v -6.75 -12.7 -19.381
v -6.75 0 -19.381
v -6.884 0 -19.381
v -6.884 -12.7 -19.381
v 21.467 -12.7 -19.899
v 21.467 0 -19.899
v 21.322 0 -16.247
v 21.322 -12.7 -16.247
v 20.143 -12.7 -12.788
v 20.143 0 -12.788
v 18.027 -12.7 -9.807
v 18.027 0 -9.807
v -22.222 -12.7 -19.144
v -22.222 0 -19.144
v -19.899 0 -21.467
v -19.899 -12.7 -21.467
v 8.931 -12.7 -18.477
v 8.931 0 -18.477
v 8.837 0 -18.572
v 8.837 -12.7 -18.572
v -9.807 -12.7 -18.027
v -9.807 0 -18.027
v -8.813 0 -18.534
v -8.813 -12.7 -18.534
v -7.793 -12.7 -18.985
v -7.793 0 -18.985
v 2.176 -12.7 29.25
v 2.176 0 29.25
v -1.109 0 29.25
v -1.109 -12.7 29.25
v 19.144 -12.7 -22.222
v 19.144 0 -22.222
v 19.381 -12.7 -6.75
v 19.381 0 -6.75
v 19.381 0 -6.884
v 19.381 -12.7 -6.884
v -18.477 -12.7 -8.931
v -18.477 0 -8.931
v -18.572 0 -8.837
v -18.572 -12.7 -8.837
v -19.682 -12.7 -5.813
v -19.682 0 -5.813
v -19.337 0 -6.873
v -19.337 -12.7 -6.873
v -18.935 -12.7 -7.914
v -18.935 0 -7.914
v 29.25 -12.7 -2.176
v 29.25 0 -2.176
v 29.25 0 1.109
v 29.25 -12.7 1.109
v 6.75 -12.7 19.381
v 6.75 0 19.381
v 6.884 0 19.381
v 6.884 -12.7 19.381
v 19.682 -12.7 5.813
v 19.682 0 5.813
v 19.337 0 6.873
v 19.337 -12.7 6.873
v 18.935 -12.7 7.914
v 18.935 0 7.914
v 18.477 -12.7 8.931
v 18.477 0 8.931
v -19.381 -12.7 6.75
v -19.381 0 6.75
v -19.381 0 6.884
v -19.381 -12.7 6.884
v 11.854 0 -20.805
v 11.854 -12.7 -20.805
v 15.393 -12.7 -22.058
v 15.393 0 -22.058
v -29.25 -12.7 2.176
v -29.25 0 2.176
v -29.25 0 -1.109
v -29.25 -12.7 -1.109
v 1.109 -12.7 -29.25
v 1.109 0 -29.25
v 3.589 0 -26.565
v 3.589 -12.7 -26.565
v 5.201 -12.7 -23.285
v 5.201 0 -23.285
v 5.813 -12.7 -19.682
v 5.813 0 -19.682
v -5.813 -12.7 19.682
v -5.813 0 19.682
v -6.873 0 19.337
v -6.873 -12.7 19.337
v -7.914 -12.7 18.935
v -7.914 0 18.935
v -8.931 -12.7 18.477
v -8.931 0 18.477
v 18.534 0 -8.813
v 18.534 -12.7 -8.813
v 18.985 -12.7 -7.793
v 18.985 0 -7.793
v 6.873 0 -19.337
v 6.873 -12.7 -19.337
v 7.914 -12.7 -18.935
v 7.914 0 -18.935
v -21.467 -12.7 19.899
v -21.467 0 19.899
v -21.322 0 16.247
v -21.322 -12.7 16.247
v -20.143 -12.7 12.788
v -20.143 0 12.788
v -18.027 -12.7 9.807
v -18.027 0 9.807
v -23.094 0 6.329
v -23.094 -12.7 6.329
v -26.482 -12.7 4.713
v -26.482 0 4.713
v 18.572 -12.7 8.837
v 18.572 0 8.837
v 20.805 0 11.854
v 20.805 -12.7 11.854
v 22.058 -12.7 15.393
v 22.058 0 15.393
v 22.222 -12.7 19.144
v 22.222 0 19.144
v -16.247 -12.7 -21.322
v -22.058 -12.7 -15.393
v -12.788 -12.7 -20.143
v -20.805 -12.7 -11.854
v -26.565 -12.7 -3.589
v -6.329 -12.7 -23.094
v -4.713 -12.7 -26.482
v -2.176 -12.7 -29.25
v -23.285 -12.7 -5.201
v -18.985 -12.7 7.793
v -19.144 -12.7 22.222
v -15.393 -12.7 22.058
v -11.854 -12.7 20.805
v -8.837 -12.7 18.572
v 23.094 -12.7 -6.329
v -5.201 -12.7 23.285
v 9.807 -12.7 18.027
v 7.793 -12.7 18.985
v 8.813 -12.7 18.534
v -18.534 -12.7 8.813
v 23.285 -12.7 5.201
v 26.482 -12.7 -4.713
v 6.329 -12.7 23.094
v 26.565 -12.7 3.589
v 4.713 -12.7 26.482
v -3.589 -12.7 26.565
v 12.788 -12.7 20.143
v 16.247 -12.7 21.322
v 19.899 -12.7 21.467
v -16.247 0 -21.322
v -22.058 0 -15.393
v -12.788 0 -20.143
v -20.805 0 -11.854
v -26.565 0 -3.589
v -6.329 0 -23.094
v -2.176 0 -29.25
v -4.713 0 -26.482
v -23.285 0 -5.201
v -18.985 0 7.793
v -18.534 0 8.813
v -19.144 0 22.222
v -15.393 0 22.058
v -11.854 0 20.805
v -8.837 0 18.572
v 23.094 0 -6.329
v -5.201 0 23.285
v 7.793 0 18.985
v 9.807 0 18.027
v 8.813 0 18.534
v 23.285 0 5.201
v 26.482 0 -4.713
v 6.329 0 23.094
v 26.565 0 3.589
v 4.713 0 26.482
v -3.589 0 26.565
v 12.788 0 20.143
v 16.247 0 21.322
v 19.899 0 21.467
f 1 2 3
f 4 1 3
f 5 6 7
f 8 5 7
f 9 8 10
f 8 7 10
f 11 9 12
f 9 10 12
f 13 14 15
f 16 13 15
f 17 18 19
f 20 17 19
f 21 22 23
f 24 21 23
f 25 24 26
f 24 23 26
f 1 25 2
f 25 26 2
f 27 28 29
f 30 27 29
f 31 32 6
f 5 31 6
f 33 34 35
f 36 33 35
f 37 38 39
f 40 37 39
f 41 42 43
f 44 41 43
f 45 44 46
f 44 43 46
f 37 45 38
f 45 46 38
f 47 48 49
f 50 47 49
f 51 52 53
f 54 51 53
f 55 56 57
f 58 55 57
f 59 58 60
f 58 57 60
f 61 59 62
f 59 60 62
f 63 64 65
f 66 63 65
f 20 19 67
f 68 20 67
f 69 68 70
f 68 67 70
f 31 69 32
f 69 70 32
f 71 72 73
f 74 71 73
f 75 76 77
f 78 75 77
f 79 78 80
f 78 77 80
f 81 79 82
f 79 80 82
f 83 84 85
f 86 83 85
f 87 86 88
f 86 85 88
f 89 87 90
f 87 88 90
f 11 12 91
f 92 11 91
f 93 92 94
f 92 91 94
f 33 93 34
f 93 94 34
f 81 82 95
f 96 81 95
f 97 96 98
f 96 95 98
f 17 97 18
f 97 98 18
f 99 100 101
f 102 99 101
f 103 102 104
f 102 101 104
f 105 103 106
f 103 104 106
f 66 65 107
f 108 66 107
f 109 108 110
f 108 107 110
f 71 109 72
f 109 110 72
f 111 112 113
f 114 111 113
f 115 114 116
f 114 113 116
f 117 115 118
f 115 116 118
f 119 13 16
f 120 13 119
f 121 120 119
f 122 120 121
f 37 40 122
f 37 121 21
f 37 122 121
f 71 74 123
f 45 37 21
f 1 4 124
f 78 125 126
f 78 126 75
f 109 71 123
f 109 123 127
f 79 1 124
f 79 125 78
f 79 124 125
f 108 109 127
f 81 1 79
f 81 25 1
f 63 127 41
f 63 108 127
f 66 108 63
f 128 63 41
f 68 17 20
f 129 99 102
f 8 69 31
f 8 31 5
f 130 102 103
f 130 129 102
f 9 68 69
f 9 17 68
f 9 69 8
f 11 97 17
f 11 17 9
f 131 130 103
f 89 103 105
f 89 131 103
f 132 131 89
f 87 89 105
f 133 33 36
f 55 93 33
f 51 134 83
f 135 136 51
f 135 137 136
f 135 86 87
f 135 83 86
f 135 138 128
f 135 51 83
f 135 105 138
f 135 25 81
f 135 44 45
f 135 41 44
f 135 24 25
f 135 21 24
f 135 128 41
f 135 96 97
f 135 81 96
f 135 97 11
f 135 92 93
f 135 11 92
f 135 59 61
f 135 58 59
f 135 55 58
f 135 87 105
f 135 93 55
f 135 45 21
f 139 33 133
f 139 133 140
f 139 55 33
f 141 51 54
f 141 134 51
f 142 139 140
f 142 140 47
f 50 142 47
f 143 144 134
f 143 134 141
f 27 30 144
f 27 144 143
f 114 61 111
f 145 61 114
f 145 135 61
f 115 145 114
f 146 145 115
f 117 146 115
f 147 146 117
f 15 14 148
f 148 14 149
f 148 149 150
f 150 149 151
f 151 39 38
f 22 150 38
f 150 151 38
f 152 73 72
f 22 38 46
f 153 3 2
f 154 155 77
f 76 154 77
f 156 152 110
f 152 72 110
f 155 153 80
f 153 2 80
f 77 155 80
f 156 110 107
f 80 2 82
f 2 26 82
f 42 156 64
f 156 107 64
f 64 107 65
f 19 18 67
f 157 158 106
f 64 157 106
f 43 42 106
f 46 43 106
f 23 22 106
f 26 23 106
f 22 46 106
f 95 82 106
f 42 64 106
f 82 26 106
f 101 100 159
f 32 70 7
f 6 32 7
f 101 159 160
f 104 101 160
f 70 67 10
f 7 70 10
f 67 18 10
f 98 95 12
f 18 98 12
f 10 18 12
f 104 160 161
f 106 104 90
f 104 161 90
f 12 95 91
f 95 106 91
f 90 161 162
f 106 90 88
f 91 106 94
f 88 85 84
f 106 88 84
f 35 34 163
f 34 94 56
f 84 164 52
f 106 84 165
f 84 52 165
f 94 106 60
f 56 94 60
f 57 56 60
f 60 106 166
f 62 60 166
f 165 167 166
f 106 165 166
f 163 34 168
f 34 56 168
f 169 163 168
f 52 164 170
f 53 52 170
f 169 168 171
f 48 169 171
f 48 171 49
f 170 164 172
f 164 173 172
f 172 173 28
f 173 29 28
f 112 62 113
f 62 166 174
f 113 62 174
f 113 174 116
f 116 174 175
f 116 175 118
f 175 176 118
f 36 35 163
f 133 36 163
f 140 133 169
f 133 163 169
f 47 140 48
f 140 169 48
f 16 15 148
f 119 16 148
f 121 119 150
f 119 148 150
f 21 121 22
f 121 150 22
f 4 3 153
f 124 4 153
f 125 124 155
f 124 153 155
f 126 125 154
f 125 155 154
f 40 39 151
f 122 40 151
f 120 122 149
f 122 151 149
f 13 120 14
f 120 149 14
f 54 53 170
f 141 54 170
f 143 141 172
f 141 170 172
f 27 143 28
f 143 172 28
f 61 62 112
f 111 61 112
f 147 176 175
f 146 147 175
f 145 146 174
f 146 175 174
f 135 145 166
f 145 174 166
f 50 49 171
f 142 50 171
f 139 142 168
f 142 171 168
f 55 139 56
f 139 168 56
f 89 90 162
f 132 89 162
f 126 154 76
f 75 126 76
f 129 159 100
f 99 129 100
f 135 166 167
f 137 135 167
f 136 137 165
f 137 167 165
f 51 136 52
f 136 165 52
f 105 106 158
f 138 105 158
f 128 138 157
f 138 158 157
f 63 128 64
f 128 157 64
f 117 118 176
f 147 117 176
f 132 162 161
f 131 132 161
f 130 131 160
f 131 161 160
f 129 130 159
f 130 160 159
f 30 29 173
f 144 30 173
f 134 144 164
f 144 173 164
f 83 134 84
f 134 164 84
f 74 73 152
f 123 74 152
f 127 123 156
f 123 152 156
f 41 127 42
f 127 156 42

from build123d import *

# Parameters (mm, degrees)
F2_DEPTH = 12.7
F1_R     = 20.5223839117
F3_DEPTH = 12.7
F4_COUNT = 8
F7_DEPTH = 12.7
F6_R     = 43.0741036452
F8_DEPTH = 12.7
F9_COUNT = 15


with BuildPart() as f2:
    # F0 (on Front) → F2 (new body)
    with BuildSketch(Plane.XZ):
        with BuildLine():
            Line((-5.8162368315, 19.3805601989), (6.8837631685, 19.3805601989))
            ThreePointArc((6.8837631685, 19.3805601989), (5.6466426807, 24.8479538456), (2.1762996585, 29.250178249))
            Line((2.1762996585, 29.250178249), (-1.1087733216, 29.250178249))
            ThreePointArc((-1.1087733216, 29.250178249), (-4.5791163438, 24.8479538456), (-5.8162368315, 19.3805601989))
        make_face()
    extrude(amount=F2_DEPTH)

    # F1 (on Front) → F3 (join)
    with BuildSketch(Plane.XZ):
        Circle(F1_R)
    extrude(amount=F3_DEPTH)

    # F4: F2 ×8 about axis
    f4_axis = Axis((0, 0, 0), (0, 1, 0))


with BuildPart() as f2_1:
    add(f2.part)
    for i in range(1, F4_COUNT):
        add(f2.part.rotate(f4_axis, i * 360 / F4_COUNT))


with BuildPart() as f7:
    # F5 (on Front) → F7 (new body)
    with BuildSketch(Plane.XZ):
        with BuildLine():
            Line((-96.6539090335, 40.7748068149), (-83.9539090335, 40.7748068149))
            ThreePointArc((-83.9539090335, 40.7748068149), (-85.1910295213, 46.2422004616), (-88.6613725435, 50.644424865))
            Line((-88.6613725435, 50.644424865), (-91.9464455236, 50.644424865))
            ThreePointArc((-91.9464455236, 50.644424865), (-95.4167885458, 46.2422004616), (-96.6539090335, 40.7748068149))
        make_face()
    extrude(amount=F7_DEPTH)

    # F6 (on Front) → F8 (join)
    with BuildSketch(Plane.XZ):
        with Locations((-88.5588899255, 0)):
            Circle(F6_R)
    extrude(amount=F8_DEPTH)

    # F9: F7 ×15 about axis
    f9_axis = Axis((-88.5588899255, 0, 0), (0, 1, 0))


with BuildPart() as f7_1:
    add(f7.part)
    for i in range(1, F9_COUNT):
        add(f7.part.rotate(f9_axis, i * 360 / F9_COUNT))


solid = f2_1.part
